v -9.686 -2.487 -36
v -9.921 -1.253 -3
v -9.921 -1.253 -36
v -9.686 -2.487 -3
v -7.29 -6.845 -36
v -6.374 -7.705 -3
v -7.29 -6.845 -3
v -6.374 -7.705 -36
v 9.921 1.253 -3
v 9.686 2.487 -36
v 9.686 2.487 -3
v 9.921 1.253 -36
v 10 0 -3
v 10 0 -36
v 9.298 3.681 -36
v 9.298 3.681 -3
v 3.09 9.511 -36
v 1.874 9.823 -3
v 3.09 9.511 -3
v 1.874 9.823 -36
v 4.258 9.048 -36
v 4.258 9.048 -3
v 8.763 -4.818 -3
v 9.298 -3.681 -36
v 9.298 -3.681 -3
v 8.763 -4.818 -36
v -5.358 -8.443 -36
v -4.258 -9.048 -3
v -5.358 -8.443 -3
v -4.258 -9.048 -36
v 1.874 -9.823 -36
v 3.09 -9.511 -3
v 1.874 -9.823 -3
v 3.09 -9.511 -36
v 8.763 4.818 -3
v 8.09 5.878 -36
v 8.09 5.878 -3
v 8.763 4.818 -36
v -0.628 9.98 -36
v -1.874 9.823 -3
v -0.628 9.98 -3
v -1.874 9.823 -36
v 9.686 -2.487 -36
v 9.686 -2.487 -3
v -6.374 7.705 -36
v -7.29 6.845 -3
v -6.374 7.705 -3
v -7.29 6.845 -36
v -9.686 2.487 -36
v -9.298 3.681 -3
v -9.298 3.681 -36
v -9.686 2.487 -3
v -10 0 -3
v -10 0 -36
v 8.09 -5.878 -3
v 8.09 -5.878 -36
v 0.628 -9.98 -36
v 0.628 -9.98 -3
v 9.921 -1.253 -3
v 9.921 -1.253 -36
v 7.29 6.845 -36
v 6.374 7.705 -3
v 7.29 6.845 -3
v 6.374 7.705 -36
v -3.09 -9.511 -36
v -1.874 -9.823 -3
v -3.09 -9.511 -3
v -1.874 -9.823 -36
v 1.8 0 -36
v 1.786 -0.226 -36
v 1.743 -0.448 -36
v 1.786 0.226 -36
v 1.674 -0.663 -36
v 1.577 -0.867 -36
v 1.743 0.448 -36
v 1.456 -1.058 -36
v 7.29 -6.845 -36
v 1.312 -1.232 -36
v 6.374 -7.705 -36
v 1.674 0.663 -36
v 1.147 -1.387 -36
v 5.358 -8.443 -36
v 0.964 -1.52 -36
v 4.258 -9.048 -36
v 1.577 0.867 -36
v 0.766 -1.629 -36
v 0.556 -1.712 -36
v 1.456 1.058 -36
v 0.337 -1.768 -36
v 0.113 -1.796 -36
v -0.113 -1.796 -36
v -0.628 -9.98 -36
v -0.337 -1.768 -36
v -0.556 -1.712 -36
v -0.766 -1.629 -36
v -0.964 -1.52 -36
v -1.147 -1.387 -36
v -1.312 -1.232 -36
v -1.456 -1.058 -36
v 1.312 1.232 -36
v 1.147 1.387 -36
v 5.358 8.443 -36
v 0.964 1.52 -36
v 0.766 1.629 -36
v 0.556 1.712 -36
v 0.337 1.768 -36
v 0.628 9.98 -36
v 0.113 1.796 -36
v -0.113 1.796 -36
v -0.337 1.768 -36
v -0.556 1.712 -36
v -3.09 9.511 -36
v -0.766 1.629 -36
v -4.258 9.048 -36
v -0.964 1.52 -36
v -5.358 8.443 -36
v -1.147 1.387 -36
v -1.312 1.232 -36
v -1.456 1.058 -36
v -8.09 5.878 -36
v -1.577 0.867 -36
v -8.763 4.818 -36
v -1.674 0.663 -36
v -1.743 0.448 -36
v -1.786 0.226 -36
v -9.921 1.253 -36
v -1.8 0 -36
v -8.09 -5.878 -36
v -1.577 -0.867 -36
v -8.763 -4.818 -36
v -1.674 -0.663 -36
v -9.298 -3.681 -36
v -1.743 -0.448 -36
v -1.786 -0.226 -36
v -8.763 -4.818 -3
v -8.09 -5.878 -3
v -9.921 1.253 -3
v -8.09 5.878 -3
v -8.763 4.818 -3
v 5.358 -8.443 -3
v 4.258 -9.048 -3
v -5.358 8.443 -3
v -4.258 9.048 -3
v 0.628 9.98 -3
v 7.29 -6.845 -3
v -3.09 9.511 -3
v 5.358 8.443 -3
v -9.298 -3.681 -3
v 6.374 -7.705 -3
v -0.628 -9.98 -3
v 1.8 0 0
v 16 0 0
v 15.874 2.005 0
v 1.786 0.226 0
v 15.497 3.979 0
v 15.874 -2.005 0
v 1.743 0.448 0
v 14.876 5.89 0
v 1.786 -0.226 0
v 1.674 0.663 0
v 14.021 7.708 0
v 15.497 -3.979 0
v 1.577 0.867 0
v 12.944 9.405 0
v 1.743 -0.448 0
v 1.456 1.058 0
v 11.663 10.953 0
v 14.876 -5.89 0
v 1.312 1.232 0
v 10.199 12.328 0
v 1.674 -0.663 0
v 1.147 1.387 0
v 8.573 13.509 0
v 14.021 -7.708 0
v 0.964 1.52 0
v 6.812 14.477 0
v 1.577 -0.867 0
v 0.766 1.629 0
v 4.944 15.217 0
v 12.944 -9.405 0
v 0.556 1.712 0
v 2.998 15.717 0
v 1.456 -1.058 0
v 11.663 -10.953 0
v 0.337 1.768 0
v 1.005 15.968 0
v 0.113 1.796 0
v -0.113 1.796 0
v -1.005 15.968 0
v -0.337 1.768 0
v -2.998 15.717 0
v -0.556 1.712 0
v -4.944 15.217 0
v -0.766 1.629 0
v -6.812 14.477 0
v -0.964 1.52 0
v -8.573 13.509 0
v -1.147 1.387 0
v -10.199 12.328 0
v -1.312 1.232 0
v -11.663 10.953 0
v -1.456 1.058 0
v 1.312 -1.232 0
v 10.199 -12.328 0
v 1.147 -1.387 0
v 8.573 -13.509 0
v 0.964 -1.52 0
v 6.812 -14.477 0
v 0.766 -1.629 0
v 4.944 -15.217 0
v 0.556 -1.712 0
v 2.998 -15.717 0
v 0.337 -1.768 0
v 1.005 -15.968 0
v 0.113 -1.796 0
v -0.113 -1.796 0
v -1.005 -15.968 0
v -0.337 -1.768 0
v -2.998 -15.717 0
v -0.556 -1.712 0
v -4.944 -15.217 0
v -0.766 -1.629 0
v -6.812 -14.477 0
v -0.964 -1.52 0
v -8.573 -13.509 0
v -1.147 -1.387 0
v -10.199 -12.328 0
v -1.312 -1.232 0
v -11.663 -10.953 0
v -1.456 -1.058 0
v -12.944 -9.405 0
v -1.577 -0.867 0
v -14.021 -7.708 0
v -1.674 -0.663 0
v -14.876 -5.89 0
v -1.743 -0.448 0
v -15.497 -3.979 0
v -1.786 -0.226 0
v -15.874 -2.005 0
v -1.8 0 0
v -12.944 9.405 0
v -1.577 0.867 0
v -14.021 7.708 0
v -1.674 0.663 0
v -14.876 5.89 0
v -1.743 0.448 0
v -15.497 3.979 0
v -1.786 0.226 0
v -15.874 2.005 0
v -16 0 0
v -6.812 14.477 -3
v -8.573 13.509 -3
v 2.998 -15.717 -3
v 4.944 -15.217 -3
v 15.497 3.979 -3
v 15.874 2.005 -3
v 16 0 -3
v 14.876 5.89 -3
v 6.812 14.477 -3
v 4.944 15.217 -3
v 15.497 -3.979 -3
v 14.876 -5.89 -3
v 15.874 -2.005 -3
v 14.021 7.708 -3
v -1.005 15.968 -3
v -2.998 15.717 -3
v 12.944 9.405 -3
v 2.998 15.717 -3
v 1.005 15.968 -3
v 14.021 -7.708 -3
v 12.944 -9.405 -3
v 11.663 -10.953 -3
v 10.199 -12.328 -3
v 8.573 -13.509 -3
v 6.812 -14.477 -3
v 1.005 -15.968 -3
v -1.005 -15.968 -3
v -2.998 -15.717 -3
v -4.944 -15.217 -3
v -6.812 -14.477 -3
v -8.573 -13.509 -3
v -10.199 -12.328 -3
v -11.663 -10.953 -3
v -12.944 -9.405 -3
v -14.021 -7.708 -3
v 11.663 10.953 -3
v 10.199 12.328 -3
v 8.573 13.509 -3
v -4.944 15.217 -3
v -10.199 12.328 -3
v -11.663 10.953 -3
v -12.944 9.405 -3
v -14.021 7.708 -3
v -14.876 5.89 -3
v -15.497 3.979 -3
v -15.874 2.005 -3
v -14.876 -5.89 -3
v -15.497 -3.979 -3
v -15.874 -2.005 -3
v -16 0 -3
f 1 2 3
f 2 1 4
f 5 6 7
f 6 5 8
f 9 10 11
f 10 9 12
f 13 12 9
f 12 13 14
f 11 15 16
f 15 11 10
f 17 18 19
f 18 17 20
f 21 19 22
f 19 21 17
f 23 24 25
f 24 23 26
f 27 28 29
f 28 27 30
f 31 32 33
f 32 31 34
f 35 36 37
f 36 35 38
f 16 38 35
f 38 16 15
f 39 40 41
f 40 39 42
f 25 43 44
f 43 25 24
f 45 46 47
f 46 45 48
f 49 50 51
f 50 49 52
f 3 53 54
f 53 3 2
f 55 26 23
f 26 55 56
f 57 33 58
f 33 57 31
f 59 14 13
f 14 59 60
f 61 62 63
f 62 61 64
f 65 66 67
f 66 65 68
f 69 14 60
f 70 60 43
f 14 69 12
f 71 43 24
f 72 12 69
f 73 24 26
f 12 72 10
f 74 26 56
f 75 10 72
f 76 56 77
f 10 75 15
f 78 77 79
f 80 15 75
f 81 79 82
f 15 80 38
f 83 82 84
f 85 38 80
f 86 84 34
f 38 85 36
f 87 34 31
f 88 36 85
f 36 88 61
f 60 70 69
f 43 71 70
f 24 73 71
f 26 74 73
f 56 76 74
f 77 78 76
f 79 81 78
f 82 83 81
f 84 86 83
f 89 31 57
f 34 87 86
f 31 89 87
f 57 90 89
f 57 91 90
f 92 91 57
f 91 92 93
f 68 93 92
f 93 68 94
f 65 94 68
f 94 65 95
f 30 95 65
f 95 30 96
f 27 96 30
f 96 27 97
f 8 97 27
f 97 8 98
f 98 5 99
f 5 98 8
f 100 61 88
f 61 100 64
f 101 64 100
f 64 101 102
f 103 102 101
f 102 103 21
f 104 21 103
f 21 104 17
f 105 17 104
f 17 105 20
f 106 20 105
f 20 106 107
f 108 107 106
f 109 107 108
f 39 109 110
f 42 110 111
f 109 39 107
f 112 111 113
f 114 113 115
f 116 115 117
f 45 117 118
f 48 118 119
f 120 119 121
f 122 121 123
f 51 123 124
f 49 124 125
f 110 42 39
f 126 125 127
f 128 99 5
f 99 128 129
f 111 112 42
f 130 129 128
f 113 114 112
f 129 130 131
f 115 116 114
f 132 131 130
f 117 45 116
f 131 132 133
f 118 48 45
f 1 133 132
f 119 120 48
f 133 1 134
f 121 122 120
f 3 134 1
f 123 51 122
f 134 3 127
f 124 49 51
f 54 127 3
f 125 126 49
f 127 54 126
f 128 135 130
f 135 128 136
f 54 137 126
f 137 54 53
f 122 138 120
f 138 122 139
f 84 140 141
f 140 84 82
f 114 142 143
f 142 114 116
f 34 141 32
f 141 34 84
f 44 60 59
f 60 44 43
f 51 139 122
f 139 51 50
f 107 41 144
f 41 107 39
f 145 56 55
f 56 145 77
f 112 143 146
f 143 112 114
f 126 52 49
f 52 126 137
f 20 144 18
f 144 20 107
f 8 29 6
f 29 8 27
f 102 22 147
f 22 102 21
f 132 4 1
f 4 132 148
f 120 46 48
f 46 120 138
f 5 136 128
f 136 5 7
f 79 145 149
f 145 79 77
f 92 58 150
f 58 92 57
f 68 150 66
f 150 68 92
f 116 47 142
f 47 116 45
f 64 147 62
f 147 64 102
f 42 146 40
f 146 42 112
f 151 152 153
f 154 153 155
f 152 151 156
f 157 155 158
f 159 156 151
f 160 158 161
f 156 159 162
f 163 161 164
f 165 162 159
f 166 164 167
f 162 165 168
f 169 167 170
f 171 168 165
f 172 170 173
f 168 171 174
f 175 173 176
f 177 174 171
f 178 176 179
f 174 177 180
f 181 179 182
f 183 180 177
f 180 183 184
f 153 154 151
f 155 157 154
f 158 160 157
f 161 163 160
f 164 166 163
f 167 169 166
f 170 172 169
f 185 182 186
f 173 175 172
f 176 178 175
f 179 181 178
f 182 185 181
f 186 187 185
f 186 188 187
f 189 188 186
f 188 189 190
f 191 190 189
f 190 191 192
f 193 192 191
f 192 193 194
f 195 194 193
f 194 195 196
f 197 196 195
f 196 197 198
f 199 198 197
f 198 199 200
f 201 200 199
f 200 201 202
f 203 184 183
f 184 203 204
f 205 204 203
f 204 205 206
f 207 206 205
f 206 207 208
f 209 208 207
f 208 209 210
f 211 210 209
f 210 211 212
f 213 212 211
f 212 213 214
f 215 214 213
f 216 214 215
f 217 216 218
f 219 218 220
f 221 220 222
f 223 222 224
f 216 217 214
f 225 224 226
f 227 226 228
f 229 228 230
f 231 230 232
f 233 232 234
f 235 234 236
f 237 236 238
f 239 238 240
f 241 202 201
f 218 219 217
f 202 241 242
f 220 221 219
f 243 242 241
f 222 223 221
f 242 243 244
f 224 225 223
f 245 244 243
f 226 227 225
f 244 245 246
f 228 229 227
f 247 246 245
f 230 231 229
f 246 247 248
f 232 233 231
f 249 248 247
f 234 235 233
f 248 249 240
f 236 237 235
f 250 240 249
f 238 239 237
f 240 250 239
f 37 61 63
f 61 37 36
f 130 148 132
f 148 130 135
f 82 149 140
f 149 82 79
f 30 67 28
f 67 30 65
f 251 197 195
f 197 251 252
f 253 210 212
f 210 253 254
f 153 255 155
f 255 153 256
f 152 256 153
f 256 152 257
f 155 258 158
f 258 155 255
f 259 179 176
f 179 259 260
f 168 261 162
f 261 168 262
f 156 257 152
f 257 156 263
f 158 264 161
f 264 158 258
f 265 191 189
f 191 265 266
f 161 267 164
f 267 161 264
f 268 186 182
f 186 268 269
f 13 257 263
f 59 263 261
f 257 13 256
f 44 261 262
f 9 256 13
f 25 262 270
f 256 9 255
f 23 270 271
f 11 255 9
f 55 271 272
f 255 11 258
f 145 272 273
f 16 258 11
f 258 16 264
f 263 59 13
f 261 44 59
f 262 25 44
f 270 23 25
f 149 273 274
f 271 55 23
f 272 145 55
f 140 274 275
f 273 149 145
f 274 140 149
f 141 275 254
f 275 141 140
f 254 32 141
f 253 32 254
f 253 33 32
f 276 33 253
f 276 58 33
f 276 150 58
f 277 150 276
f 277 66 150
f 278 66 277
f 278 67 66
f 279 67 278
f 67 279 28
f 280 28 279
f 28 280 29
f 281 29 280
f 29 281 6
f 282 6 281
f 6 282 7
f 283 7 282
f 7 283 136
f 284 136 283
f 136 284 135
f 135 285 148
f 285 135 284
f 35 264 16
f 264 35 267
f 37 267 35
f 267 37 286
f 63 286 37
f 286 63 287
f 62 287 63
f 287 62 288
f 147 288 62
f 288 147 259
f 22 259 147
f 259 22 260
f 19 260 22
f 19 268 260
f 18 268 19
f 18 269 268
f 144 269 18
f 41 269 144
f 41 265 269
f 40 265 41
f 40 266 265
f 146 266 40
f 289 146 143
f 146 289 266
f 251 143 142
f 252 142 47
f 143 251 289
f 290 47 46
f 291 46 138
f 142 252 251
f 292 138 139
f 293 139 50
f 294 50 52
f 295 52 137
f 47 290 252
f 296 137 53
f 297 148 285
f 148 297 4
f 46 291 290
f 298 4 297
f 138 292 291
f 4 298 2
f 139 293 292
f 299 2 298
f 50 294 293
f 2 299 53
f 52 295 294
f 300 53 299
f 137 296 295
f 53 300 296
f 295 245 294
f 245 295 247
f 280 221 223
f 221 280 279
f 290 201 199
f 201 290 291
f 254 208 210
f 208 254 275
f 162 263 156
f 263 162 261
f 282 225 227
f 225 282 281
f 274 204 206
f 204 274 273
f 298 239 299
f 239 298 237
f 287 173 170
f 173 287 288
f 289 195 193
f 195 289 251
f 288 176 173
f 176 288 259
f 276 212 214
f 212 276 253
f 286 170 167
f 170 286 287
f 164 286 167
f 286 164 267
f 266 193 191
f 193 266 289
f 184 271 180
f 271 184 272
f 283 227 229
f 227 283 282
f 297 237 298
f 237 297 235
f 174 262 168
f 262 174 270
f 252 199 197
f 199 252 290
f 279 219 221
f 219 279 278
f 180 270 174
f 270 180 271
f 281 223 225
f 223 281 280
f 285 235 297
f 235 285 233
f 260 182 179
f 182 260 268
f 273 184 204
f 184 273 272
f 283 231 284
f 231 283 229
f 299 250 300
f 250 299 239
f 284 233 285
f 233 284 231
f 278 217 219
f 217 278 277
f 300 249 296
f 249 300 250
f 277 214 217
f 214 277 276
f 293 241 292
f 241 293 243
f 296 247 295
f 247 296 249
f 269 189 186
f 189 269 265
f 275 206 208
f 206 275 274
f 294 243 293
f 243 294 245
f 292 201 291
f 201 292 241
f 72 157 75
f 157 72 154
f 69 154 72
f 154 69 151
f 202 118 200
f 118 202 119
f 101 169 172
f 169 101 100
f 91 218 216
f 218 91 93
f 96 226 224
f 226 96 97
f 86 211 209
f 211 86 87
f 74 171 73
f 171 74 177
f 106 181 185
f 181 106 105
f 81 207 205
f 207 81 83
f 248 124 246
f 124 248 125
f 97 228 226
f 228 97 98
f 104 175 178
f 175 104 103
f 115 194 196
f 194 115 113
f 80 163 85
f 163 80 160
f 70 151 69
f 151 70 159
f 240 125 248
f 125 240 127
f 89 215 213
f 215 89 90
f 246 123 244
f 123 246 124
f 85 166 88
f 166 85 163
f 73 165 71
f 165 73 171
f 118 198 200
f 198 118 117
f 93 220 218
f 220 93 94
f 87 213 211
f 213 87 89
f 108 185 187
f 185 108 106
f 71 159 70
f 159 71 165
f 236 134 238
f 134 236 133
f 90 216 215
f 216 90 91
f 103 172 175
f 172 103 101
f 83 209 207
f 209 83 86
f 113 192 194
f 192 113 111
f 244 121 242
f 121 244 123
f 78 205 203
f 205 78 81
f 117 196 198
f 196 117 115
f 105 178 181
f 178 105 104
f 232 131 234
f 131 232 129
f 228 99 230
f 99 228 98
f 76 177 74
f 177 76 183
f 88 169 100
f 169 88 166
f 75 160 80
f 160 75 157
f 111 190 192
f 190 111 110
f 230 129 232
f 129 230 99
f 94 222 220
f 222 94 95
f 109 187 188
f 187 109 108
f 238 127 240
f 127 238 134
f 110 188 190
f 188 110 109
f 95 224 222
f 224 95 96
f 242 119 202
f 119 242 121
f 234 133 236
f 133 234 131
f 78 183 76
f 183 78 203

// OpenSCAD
$fn = 50;


difference() {
	union() {
		translate(v = [0, 0, -36.0000000000]) {
			cylinder(h = 36, r = 10.0000000000);
		}
		translate(v = [0, 0, -3.0000000000]) {
			cylinder(h = 3, r = 16.0000000000);
		}
	}
	union() {
		#translate(v = [0, 0, -36]) {
			cylinder(h = 36, r = 1.8000000000);
		}
	}
}
